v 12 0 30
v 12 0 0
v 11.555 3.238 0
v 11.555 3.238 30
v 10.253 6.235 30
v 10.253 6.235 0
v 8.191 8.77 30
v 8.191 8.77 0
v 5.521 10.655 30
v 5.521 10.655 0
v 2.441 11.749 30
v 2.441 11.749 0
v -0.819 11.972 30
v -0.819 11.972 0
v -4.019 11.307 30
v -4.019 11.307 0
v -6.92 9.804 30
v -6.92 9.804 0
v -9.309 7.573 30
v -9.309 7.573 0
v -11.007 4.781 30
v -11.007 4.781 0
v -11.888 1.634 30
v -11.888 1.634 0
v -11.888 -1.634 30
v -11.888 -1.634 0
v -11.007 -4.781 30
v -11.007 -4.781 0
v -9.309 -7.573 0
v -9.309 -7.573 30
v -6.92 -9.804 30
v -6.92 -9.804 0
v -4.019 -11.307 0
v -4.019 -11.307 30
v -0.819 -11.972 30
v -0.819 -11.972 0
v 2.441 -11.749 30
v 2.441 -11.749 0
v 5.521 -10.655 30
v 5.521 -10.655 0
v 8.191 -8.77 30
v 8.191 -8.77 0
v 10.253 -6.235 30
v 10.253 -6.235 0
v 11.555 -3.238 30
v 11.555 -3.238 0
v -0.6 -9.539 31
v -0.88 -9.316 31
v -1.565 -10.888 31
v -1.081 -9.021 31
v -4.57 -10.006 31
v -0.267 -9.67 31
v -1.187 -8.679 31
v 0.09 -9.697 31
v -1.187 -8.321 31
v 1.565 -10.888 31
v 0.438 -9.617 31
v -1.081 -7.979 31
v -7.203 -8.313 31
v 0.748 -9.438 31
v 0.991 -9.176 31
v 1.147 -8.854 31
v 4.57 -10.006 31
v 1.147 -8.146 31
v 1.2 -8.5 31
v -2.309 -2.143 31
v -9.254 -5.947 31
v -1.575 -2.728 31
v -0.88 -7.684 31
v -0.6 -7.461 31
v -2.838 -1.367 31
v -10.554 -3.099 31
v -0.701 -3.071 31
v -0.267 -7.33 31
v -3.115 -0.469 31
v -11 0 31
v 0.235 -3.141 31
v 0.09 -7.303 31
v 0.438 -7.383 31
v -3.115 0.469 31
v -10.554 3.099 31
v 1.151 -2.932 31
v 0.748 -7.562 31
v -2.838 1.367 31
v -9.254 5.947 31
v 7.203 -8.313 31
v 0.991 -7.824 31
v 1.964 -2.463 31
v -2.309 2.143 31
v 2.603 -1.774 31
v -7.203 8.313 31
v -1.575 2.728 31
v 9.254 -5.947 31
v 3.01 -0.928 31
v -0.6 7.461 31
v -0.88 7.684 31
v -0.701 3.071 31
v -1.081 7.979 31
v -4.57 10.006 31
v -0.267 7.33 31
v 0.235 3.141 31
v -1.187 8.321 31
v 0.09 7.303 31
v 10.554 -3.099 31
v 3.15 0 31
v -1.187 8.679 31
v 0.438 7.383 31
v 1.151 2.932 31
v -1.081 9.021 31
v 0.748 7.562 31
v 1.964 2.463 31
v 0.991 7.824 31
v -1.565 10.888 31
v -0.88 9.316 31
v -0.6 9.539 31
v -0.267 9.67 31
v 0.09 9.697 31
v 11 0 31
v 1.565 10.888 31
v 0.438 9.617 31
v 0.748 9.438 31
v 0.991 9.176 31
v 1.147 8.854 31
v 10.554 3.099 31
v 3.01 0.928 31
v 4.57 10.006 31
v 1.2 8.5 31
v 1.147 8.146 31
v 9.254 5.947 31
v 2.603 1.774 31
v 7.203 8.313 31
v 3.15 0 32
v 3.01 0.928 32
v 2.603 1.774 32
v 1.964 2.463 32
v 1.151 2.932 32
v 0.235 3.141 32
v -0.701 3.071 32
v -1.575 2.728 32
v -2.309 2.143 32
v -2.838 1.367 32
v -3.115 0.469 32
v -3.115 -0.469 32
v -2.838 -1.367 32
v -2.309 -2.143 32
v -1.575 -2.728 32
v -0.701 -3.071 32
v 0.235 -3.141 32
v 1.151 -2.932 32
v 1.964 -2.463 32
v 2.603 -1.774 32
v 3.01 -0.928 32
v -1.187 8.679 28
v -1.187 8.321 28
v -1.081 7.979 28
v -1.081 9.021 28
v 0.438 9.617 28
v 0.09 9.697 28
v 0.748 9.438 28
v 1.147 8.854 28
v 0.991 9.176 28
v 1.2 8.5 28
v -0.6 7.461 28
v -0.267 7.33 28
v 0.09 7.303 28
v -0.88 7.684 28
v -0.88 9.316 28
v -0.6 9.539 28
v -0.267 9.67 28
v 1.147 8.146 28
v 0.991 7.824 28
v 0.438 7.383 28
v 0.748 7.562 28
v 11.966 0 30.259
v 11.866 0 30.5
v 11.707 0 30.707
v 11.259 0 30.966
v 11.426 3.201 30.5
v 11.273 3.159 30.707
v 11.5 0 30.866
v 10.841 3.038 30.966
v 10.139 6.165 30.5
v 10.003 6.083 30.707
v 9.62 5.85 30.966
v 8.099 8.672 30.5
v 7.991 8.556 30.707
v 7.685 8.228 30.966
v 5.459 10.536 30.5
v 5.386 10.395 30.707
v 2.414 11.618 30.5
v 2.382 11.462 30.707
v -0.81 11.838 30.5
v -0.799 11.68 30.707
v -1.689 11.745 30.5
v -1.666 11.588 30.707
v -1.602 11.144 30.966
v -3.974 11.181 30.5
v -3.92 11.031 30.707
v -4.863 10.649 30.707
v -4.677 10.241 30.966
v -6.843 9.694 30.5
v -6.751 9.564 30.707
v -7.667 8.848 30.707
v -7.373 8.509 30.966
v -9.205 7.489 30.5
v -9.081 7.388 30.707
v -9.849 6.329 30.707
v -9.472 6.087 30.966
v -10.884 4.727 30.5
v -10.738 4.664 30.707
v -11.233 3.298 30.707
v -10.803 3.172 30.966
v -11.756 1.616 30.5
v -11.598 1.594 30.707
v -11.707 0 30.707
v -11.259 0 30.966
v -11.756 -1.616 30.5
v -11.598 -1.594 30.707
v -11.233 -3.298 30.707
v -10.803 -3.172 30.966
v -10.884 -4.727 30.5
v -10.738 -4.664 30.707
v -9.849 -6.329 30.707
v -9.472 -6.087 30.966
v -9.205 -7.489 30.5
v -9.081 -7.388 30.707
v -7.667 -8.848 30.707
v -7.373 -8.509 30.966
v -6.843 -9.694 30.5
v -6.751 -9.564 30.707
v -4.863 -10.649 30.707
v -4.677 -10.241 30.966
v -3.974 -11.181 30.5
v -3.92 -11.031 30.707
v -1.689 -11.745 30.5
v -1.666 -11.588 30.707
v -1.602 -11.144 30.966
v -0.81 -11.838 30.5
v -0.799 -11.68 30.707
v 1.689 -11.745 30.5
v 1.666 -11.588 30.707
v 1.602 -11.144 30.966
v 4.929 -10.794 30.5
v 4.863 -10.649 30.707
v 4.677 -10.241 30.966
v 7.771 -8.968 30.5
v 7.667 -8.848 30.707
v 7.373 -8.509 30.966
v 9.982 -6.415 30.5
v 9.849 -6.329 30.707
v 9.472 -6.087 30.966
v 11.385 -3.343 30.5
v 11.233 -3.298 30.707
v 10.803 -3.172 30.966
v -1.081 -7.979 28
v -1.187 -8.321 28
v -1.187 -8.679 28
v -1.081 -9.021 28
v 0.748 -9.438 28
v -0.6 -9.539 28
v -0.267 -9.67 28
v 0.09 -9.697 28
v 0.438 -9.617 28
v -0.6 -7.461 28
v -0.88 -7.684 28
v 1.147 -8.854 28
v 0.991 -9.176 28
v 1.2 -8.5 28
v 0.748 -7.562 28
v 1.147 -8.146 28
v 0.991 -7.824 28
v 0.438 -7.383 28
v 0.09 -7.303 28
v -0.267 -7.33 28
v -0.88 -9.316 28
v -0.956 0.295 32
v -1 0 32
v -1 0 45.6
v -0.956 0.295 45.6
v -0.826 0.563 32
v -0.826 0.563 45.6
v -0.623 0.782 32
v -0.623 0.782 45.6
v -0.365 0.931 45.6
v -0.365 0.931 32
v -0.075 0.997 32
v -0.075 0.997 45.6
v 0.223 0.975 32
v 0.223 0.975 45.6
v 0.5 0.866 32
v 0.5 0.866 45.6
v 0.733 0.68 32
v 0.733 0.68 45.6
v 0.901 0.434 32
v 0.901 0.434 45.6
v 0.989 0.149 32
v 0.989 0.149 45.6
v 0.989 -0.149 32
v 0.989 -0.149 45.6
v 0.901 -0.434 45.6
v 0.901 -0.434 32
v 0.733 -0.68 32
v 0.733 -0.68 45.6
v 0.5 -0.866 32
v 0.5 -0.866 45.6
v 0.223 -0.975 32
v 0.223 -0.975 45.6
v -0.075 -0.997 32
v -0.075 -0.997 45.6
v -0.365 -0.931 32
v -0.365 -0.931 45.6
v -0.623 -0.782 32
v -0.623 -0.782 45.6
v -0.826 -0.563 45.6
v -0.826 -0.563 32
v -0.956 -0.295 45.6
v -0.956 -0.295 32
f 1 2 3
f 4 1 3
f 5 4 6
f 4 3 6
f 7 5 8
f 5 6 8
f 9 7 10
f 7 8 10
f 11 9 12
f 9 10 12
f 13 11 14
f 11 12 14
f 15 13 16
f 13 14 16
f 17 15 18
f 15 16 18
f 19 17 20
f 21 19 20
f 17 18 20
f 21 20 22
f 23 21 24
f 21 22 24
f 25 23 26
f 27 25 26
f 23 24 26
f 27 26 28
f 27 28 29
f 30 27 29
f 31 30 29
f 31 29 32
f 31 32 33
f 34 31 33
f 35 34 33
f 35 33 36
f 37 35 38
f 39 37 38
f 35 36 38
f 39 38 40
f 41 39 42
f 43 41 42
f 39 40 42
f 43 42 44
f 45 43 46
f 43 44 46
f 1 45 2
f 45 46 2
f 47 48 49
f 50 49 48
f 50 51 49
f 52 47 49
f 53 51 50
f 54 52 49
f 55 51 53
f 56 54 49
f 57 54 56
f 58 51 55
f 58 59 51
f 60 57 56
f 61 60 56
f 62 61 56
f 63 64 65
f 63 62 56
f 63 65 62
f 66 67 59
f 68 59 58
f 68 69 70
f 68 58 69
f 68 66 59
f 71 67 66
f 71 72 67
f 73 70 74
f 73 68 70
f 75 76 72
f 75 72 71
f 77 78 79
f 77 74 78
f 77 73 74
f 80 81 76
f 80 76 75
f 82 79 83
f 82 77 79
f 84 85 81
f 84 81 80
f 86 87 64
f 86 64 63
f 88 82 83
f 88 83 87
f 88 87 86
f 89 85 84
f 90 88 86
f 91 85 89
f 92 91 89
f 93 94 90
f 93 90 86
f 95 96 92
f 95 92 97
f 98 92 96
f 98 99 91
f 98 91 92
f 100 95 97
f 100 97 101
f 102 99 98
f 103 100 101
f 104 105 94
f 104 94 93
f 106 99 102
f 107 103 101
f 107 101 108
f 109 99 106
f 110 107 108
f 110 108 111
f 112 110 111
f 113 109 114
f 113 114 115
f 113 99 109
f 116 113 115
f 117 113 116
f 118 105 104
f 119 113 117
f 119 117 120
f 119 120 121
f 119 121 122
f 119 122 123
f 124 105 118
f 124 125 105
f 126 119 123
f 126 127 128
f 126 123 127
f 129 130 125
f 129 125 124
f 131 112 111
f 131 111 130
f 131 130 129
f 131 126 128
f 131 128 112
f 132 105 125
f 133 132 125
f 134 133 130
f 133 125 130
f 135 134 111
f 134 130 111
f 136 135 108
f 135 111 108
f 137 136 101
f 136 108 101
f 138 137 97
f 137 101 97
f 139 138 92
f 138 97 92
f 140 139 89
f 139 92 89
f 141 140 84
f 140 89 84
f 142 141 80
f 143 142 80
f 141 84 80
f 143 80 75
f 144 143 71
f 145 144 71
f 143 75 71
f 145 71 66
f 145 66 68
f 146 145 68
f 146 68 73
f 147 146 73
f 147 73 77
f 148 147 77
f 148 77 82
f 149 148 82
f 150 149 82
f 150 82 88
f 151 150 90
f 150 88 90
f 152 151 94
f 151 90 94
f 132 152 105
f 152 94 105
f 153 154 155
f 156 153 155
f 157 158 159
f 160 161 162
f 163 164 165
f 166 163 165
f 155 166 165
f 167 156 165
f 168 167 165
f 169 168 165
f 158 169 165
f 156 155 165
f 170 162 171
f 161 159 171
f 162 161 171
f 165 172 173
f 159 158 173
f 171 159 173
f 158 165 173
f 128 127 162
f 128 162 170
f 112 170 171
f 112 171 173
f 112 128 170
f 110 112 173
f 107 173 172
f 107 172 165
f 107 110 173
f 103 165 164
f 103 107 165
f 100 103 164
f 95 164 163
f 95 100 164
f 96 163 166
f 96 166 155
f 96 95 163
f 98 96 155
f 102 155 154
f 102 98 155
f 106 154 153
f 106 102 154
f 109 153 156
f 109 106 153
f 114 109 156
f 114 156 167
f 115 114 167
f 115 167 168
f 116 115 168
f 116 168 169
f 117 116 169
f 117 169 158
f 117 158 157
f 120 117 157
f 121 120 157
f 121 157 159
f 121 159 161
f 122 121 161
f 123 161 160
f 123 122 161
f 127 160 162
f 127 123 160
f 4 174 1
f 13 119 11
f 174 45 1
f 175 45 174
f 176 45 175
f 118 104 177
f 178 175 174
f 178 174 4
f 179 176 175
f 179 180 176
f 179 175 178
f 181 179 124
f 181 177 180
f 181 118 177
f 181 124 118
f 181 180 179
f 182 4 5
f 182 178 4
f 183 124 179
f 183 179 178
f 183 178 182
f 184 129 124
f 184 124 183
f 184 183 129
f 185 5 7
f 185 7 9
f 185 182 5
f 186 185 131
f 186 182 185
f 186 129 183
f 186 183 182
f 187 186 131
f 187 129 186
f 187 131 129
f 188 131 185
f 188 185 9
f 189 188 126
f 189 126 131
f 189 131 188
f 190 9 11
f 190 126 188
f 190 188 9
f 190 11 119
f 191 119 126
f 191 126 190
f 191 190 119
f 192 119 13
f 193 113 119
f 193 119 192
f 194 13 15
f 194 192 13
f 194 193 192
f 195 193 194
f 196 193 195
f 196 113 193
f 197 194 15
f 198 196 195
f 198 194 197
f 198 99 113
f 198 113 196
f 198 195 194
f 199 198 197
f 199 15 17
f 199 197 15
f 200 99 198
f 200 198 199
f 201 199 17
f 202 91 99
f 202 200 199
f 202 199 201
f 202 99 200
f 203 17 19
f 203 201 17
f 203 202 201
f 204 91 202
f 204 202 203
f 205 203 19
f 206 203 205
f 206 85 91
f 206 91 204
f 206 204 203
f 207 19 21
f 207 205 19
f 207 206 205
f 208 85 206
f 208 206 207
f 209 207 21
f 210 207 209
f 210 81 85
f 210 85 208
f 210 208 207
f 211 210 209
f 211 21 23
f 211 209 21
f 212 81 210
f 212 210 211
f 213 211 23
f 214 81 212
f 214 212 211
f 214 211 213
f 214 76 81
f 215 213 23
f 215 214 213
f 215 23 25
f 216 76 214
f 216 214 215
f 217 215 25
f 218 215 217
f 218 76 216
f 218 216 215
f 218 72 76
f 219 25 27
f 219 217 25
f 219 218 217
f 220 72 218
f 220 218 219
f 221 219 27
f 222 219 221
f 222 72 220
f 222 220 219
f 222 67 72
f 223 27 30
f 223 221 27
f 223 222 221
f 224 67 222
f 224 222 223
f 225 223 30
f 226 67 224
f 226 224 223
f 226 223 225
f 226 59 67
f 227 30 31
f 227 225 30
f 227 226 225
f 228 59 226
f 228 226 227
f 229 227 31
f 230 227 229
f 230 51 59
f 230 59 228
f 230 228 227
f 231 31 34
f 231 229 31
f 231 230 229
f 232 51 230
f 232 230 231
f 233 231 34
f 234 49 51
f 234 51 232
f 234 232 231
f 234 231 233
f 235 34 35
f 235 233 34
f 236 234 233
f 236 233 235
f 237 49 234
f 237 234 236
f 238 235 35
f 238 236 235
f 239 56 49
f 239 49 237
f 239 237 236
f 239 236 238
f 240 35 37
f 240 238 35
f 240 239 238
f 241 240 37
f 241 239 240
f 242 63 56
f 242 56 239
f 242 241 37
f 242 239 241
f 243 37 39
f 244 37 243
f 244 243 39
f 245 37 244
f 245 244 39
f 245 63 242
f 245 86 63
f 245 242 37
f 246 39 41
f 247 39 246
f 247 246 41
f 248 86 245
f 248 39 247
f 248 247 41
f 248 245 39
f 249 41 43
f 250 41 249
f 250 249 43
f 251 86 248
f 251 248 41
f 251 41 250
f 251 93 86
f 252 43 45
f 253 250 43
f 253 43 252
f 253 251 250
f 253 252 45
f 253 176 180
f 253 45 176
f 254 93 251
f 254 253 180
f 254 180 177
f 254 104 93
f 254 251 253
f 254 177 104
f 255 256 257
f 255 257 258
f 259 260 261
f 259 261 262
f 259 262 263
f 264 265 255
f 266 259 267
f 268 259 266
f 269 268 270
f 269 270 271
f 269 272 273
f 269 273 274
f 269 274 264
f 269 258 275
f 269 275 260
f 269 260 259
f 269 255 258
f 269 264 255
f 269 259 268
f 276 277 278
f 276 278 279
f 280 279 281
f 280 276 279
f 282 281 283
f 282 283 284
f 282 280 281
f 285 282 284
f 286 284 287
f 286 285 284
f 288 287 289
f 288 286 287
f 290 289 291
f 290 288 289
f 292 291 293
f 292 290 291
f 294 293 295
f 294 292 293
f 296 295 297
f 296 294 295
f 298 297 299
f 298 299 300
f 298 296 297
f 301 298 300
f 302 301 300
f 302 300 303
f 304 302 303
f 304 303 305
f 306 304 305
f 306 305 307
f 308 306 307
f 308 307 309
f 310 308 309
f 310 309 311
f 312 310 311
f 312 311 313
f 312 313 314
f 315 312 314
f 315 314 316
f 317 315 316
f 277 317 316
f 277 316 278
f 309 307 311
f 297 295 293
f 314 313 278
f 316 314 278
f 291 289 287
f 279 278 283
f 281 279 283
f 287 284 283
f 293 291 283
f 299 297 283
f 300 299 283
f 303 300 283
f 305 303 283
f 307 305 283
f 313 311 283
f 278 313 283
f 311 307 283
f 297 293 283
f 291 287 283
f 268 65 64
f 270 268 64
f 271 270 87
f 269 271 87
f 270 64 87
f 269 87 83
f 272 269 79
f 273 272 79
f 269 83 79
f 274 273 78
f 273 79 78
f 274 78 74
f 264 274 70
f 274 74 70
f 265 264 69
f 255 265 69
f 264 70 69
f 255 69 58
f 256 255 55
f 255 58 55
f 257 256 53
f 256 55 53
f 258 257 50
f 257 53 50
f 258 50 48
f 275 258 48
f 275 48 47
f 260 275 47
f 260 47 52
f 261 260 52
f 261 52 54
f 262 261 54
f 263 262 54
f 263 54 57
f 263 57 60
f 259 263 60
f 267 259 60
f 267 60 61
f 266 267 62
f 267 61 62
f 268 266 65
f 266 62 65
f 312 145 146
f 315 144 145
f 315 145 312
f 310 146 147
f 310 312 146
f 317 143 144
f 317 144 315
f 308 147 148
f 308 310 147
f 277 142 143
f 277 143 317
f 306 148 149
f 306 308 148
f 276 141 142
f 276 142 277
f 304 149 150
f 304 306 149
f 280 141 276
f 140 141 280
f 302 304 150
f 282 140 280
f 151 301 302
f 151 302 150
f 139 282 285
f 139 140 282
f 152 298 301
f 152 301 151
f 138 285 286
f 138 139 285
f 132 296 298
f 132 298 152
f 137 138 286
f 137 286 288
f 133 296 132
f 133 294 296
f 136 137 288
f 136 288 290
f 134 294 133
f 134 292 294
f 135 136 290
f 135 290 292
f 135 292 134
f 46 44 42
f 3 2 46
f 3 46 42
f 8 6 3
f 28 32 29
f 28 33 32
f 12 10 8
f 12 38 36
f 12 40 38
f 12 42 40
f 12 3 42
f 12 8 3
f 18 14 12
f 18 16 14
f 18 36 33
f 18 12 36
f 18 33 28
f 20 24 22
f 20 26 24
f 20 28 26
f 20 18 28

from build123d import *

# Parameters (mm, degrees)
SKETCH1_R           = 12
BOSS_EXTRUDE1_DEPTH = 31
FILLET1_R           = 1
SKETCH2_R           = 3.15
BOSS_EXTRUDE2_DEPTH = 1
SKETCH4_R           = 1
BOSS_EXTRUDE3_DEPTH = 45.6
SKETCH5_R           = 1.2
CUT_EXTRUDE1_DEPTH  = 3


with BuildPart() as part:
    # Sketch1 → Boss-Extrude1 (new body)
    with BuildSketch(Plane.XY):
        Circle(SKETCH1_R)
    extrude(amount=BOSS_EXTRUDE1_DEPTH)

    # Fillet1
    fillet1_edges = [part.edges().sort_by_distance(p)[0] for p in [
        (-12, 0, 31),
    ]]
    fillet(fillet1_edges, radius=FILLET1_R)

    # Sketch2 → Boss-Extrude2 (add)
    with BuildSketch(Plane.XY.offset(31)):
        Circle(SKETCH2_R)
    extrude(amount=BOSS_EXTRUDE2_DEPTH)

    # Sketch4 → Boss-Extrude3 (add)
    with BuildSketch(Plane(origin=(0, 0, 0), x_dir=(-1, 0, 0), z_dir=(0, 0, -1))):
        Circle(SKETCH4_R)
    extrude(amount=-BOSS_EXTRUDE3_DEPTH)

    # Sketch5 → Cut-Extrude1 (cut)
    with BuildSketch(Plane.XY.offset(31)):
        with Locations((0, -8.5)):
            Circle(SKETCH5_R)
    cut_extrude1 = extrude(amount=-CUT_EXTRUDE1_DEPTH, mode=Mode.SUBTRACT)

    # Mirror1: Cut-Extrude1 across plane
    add(cut_extrude1.mirror(Plane.ZX), mode=Mode.SUBTRACT)


solid = part.part
